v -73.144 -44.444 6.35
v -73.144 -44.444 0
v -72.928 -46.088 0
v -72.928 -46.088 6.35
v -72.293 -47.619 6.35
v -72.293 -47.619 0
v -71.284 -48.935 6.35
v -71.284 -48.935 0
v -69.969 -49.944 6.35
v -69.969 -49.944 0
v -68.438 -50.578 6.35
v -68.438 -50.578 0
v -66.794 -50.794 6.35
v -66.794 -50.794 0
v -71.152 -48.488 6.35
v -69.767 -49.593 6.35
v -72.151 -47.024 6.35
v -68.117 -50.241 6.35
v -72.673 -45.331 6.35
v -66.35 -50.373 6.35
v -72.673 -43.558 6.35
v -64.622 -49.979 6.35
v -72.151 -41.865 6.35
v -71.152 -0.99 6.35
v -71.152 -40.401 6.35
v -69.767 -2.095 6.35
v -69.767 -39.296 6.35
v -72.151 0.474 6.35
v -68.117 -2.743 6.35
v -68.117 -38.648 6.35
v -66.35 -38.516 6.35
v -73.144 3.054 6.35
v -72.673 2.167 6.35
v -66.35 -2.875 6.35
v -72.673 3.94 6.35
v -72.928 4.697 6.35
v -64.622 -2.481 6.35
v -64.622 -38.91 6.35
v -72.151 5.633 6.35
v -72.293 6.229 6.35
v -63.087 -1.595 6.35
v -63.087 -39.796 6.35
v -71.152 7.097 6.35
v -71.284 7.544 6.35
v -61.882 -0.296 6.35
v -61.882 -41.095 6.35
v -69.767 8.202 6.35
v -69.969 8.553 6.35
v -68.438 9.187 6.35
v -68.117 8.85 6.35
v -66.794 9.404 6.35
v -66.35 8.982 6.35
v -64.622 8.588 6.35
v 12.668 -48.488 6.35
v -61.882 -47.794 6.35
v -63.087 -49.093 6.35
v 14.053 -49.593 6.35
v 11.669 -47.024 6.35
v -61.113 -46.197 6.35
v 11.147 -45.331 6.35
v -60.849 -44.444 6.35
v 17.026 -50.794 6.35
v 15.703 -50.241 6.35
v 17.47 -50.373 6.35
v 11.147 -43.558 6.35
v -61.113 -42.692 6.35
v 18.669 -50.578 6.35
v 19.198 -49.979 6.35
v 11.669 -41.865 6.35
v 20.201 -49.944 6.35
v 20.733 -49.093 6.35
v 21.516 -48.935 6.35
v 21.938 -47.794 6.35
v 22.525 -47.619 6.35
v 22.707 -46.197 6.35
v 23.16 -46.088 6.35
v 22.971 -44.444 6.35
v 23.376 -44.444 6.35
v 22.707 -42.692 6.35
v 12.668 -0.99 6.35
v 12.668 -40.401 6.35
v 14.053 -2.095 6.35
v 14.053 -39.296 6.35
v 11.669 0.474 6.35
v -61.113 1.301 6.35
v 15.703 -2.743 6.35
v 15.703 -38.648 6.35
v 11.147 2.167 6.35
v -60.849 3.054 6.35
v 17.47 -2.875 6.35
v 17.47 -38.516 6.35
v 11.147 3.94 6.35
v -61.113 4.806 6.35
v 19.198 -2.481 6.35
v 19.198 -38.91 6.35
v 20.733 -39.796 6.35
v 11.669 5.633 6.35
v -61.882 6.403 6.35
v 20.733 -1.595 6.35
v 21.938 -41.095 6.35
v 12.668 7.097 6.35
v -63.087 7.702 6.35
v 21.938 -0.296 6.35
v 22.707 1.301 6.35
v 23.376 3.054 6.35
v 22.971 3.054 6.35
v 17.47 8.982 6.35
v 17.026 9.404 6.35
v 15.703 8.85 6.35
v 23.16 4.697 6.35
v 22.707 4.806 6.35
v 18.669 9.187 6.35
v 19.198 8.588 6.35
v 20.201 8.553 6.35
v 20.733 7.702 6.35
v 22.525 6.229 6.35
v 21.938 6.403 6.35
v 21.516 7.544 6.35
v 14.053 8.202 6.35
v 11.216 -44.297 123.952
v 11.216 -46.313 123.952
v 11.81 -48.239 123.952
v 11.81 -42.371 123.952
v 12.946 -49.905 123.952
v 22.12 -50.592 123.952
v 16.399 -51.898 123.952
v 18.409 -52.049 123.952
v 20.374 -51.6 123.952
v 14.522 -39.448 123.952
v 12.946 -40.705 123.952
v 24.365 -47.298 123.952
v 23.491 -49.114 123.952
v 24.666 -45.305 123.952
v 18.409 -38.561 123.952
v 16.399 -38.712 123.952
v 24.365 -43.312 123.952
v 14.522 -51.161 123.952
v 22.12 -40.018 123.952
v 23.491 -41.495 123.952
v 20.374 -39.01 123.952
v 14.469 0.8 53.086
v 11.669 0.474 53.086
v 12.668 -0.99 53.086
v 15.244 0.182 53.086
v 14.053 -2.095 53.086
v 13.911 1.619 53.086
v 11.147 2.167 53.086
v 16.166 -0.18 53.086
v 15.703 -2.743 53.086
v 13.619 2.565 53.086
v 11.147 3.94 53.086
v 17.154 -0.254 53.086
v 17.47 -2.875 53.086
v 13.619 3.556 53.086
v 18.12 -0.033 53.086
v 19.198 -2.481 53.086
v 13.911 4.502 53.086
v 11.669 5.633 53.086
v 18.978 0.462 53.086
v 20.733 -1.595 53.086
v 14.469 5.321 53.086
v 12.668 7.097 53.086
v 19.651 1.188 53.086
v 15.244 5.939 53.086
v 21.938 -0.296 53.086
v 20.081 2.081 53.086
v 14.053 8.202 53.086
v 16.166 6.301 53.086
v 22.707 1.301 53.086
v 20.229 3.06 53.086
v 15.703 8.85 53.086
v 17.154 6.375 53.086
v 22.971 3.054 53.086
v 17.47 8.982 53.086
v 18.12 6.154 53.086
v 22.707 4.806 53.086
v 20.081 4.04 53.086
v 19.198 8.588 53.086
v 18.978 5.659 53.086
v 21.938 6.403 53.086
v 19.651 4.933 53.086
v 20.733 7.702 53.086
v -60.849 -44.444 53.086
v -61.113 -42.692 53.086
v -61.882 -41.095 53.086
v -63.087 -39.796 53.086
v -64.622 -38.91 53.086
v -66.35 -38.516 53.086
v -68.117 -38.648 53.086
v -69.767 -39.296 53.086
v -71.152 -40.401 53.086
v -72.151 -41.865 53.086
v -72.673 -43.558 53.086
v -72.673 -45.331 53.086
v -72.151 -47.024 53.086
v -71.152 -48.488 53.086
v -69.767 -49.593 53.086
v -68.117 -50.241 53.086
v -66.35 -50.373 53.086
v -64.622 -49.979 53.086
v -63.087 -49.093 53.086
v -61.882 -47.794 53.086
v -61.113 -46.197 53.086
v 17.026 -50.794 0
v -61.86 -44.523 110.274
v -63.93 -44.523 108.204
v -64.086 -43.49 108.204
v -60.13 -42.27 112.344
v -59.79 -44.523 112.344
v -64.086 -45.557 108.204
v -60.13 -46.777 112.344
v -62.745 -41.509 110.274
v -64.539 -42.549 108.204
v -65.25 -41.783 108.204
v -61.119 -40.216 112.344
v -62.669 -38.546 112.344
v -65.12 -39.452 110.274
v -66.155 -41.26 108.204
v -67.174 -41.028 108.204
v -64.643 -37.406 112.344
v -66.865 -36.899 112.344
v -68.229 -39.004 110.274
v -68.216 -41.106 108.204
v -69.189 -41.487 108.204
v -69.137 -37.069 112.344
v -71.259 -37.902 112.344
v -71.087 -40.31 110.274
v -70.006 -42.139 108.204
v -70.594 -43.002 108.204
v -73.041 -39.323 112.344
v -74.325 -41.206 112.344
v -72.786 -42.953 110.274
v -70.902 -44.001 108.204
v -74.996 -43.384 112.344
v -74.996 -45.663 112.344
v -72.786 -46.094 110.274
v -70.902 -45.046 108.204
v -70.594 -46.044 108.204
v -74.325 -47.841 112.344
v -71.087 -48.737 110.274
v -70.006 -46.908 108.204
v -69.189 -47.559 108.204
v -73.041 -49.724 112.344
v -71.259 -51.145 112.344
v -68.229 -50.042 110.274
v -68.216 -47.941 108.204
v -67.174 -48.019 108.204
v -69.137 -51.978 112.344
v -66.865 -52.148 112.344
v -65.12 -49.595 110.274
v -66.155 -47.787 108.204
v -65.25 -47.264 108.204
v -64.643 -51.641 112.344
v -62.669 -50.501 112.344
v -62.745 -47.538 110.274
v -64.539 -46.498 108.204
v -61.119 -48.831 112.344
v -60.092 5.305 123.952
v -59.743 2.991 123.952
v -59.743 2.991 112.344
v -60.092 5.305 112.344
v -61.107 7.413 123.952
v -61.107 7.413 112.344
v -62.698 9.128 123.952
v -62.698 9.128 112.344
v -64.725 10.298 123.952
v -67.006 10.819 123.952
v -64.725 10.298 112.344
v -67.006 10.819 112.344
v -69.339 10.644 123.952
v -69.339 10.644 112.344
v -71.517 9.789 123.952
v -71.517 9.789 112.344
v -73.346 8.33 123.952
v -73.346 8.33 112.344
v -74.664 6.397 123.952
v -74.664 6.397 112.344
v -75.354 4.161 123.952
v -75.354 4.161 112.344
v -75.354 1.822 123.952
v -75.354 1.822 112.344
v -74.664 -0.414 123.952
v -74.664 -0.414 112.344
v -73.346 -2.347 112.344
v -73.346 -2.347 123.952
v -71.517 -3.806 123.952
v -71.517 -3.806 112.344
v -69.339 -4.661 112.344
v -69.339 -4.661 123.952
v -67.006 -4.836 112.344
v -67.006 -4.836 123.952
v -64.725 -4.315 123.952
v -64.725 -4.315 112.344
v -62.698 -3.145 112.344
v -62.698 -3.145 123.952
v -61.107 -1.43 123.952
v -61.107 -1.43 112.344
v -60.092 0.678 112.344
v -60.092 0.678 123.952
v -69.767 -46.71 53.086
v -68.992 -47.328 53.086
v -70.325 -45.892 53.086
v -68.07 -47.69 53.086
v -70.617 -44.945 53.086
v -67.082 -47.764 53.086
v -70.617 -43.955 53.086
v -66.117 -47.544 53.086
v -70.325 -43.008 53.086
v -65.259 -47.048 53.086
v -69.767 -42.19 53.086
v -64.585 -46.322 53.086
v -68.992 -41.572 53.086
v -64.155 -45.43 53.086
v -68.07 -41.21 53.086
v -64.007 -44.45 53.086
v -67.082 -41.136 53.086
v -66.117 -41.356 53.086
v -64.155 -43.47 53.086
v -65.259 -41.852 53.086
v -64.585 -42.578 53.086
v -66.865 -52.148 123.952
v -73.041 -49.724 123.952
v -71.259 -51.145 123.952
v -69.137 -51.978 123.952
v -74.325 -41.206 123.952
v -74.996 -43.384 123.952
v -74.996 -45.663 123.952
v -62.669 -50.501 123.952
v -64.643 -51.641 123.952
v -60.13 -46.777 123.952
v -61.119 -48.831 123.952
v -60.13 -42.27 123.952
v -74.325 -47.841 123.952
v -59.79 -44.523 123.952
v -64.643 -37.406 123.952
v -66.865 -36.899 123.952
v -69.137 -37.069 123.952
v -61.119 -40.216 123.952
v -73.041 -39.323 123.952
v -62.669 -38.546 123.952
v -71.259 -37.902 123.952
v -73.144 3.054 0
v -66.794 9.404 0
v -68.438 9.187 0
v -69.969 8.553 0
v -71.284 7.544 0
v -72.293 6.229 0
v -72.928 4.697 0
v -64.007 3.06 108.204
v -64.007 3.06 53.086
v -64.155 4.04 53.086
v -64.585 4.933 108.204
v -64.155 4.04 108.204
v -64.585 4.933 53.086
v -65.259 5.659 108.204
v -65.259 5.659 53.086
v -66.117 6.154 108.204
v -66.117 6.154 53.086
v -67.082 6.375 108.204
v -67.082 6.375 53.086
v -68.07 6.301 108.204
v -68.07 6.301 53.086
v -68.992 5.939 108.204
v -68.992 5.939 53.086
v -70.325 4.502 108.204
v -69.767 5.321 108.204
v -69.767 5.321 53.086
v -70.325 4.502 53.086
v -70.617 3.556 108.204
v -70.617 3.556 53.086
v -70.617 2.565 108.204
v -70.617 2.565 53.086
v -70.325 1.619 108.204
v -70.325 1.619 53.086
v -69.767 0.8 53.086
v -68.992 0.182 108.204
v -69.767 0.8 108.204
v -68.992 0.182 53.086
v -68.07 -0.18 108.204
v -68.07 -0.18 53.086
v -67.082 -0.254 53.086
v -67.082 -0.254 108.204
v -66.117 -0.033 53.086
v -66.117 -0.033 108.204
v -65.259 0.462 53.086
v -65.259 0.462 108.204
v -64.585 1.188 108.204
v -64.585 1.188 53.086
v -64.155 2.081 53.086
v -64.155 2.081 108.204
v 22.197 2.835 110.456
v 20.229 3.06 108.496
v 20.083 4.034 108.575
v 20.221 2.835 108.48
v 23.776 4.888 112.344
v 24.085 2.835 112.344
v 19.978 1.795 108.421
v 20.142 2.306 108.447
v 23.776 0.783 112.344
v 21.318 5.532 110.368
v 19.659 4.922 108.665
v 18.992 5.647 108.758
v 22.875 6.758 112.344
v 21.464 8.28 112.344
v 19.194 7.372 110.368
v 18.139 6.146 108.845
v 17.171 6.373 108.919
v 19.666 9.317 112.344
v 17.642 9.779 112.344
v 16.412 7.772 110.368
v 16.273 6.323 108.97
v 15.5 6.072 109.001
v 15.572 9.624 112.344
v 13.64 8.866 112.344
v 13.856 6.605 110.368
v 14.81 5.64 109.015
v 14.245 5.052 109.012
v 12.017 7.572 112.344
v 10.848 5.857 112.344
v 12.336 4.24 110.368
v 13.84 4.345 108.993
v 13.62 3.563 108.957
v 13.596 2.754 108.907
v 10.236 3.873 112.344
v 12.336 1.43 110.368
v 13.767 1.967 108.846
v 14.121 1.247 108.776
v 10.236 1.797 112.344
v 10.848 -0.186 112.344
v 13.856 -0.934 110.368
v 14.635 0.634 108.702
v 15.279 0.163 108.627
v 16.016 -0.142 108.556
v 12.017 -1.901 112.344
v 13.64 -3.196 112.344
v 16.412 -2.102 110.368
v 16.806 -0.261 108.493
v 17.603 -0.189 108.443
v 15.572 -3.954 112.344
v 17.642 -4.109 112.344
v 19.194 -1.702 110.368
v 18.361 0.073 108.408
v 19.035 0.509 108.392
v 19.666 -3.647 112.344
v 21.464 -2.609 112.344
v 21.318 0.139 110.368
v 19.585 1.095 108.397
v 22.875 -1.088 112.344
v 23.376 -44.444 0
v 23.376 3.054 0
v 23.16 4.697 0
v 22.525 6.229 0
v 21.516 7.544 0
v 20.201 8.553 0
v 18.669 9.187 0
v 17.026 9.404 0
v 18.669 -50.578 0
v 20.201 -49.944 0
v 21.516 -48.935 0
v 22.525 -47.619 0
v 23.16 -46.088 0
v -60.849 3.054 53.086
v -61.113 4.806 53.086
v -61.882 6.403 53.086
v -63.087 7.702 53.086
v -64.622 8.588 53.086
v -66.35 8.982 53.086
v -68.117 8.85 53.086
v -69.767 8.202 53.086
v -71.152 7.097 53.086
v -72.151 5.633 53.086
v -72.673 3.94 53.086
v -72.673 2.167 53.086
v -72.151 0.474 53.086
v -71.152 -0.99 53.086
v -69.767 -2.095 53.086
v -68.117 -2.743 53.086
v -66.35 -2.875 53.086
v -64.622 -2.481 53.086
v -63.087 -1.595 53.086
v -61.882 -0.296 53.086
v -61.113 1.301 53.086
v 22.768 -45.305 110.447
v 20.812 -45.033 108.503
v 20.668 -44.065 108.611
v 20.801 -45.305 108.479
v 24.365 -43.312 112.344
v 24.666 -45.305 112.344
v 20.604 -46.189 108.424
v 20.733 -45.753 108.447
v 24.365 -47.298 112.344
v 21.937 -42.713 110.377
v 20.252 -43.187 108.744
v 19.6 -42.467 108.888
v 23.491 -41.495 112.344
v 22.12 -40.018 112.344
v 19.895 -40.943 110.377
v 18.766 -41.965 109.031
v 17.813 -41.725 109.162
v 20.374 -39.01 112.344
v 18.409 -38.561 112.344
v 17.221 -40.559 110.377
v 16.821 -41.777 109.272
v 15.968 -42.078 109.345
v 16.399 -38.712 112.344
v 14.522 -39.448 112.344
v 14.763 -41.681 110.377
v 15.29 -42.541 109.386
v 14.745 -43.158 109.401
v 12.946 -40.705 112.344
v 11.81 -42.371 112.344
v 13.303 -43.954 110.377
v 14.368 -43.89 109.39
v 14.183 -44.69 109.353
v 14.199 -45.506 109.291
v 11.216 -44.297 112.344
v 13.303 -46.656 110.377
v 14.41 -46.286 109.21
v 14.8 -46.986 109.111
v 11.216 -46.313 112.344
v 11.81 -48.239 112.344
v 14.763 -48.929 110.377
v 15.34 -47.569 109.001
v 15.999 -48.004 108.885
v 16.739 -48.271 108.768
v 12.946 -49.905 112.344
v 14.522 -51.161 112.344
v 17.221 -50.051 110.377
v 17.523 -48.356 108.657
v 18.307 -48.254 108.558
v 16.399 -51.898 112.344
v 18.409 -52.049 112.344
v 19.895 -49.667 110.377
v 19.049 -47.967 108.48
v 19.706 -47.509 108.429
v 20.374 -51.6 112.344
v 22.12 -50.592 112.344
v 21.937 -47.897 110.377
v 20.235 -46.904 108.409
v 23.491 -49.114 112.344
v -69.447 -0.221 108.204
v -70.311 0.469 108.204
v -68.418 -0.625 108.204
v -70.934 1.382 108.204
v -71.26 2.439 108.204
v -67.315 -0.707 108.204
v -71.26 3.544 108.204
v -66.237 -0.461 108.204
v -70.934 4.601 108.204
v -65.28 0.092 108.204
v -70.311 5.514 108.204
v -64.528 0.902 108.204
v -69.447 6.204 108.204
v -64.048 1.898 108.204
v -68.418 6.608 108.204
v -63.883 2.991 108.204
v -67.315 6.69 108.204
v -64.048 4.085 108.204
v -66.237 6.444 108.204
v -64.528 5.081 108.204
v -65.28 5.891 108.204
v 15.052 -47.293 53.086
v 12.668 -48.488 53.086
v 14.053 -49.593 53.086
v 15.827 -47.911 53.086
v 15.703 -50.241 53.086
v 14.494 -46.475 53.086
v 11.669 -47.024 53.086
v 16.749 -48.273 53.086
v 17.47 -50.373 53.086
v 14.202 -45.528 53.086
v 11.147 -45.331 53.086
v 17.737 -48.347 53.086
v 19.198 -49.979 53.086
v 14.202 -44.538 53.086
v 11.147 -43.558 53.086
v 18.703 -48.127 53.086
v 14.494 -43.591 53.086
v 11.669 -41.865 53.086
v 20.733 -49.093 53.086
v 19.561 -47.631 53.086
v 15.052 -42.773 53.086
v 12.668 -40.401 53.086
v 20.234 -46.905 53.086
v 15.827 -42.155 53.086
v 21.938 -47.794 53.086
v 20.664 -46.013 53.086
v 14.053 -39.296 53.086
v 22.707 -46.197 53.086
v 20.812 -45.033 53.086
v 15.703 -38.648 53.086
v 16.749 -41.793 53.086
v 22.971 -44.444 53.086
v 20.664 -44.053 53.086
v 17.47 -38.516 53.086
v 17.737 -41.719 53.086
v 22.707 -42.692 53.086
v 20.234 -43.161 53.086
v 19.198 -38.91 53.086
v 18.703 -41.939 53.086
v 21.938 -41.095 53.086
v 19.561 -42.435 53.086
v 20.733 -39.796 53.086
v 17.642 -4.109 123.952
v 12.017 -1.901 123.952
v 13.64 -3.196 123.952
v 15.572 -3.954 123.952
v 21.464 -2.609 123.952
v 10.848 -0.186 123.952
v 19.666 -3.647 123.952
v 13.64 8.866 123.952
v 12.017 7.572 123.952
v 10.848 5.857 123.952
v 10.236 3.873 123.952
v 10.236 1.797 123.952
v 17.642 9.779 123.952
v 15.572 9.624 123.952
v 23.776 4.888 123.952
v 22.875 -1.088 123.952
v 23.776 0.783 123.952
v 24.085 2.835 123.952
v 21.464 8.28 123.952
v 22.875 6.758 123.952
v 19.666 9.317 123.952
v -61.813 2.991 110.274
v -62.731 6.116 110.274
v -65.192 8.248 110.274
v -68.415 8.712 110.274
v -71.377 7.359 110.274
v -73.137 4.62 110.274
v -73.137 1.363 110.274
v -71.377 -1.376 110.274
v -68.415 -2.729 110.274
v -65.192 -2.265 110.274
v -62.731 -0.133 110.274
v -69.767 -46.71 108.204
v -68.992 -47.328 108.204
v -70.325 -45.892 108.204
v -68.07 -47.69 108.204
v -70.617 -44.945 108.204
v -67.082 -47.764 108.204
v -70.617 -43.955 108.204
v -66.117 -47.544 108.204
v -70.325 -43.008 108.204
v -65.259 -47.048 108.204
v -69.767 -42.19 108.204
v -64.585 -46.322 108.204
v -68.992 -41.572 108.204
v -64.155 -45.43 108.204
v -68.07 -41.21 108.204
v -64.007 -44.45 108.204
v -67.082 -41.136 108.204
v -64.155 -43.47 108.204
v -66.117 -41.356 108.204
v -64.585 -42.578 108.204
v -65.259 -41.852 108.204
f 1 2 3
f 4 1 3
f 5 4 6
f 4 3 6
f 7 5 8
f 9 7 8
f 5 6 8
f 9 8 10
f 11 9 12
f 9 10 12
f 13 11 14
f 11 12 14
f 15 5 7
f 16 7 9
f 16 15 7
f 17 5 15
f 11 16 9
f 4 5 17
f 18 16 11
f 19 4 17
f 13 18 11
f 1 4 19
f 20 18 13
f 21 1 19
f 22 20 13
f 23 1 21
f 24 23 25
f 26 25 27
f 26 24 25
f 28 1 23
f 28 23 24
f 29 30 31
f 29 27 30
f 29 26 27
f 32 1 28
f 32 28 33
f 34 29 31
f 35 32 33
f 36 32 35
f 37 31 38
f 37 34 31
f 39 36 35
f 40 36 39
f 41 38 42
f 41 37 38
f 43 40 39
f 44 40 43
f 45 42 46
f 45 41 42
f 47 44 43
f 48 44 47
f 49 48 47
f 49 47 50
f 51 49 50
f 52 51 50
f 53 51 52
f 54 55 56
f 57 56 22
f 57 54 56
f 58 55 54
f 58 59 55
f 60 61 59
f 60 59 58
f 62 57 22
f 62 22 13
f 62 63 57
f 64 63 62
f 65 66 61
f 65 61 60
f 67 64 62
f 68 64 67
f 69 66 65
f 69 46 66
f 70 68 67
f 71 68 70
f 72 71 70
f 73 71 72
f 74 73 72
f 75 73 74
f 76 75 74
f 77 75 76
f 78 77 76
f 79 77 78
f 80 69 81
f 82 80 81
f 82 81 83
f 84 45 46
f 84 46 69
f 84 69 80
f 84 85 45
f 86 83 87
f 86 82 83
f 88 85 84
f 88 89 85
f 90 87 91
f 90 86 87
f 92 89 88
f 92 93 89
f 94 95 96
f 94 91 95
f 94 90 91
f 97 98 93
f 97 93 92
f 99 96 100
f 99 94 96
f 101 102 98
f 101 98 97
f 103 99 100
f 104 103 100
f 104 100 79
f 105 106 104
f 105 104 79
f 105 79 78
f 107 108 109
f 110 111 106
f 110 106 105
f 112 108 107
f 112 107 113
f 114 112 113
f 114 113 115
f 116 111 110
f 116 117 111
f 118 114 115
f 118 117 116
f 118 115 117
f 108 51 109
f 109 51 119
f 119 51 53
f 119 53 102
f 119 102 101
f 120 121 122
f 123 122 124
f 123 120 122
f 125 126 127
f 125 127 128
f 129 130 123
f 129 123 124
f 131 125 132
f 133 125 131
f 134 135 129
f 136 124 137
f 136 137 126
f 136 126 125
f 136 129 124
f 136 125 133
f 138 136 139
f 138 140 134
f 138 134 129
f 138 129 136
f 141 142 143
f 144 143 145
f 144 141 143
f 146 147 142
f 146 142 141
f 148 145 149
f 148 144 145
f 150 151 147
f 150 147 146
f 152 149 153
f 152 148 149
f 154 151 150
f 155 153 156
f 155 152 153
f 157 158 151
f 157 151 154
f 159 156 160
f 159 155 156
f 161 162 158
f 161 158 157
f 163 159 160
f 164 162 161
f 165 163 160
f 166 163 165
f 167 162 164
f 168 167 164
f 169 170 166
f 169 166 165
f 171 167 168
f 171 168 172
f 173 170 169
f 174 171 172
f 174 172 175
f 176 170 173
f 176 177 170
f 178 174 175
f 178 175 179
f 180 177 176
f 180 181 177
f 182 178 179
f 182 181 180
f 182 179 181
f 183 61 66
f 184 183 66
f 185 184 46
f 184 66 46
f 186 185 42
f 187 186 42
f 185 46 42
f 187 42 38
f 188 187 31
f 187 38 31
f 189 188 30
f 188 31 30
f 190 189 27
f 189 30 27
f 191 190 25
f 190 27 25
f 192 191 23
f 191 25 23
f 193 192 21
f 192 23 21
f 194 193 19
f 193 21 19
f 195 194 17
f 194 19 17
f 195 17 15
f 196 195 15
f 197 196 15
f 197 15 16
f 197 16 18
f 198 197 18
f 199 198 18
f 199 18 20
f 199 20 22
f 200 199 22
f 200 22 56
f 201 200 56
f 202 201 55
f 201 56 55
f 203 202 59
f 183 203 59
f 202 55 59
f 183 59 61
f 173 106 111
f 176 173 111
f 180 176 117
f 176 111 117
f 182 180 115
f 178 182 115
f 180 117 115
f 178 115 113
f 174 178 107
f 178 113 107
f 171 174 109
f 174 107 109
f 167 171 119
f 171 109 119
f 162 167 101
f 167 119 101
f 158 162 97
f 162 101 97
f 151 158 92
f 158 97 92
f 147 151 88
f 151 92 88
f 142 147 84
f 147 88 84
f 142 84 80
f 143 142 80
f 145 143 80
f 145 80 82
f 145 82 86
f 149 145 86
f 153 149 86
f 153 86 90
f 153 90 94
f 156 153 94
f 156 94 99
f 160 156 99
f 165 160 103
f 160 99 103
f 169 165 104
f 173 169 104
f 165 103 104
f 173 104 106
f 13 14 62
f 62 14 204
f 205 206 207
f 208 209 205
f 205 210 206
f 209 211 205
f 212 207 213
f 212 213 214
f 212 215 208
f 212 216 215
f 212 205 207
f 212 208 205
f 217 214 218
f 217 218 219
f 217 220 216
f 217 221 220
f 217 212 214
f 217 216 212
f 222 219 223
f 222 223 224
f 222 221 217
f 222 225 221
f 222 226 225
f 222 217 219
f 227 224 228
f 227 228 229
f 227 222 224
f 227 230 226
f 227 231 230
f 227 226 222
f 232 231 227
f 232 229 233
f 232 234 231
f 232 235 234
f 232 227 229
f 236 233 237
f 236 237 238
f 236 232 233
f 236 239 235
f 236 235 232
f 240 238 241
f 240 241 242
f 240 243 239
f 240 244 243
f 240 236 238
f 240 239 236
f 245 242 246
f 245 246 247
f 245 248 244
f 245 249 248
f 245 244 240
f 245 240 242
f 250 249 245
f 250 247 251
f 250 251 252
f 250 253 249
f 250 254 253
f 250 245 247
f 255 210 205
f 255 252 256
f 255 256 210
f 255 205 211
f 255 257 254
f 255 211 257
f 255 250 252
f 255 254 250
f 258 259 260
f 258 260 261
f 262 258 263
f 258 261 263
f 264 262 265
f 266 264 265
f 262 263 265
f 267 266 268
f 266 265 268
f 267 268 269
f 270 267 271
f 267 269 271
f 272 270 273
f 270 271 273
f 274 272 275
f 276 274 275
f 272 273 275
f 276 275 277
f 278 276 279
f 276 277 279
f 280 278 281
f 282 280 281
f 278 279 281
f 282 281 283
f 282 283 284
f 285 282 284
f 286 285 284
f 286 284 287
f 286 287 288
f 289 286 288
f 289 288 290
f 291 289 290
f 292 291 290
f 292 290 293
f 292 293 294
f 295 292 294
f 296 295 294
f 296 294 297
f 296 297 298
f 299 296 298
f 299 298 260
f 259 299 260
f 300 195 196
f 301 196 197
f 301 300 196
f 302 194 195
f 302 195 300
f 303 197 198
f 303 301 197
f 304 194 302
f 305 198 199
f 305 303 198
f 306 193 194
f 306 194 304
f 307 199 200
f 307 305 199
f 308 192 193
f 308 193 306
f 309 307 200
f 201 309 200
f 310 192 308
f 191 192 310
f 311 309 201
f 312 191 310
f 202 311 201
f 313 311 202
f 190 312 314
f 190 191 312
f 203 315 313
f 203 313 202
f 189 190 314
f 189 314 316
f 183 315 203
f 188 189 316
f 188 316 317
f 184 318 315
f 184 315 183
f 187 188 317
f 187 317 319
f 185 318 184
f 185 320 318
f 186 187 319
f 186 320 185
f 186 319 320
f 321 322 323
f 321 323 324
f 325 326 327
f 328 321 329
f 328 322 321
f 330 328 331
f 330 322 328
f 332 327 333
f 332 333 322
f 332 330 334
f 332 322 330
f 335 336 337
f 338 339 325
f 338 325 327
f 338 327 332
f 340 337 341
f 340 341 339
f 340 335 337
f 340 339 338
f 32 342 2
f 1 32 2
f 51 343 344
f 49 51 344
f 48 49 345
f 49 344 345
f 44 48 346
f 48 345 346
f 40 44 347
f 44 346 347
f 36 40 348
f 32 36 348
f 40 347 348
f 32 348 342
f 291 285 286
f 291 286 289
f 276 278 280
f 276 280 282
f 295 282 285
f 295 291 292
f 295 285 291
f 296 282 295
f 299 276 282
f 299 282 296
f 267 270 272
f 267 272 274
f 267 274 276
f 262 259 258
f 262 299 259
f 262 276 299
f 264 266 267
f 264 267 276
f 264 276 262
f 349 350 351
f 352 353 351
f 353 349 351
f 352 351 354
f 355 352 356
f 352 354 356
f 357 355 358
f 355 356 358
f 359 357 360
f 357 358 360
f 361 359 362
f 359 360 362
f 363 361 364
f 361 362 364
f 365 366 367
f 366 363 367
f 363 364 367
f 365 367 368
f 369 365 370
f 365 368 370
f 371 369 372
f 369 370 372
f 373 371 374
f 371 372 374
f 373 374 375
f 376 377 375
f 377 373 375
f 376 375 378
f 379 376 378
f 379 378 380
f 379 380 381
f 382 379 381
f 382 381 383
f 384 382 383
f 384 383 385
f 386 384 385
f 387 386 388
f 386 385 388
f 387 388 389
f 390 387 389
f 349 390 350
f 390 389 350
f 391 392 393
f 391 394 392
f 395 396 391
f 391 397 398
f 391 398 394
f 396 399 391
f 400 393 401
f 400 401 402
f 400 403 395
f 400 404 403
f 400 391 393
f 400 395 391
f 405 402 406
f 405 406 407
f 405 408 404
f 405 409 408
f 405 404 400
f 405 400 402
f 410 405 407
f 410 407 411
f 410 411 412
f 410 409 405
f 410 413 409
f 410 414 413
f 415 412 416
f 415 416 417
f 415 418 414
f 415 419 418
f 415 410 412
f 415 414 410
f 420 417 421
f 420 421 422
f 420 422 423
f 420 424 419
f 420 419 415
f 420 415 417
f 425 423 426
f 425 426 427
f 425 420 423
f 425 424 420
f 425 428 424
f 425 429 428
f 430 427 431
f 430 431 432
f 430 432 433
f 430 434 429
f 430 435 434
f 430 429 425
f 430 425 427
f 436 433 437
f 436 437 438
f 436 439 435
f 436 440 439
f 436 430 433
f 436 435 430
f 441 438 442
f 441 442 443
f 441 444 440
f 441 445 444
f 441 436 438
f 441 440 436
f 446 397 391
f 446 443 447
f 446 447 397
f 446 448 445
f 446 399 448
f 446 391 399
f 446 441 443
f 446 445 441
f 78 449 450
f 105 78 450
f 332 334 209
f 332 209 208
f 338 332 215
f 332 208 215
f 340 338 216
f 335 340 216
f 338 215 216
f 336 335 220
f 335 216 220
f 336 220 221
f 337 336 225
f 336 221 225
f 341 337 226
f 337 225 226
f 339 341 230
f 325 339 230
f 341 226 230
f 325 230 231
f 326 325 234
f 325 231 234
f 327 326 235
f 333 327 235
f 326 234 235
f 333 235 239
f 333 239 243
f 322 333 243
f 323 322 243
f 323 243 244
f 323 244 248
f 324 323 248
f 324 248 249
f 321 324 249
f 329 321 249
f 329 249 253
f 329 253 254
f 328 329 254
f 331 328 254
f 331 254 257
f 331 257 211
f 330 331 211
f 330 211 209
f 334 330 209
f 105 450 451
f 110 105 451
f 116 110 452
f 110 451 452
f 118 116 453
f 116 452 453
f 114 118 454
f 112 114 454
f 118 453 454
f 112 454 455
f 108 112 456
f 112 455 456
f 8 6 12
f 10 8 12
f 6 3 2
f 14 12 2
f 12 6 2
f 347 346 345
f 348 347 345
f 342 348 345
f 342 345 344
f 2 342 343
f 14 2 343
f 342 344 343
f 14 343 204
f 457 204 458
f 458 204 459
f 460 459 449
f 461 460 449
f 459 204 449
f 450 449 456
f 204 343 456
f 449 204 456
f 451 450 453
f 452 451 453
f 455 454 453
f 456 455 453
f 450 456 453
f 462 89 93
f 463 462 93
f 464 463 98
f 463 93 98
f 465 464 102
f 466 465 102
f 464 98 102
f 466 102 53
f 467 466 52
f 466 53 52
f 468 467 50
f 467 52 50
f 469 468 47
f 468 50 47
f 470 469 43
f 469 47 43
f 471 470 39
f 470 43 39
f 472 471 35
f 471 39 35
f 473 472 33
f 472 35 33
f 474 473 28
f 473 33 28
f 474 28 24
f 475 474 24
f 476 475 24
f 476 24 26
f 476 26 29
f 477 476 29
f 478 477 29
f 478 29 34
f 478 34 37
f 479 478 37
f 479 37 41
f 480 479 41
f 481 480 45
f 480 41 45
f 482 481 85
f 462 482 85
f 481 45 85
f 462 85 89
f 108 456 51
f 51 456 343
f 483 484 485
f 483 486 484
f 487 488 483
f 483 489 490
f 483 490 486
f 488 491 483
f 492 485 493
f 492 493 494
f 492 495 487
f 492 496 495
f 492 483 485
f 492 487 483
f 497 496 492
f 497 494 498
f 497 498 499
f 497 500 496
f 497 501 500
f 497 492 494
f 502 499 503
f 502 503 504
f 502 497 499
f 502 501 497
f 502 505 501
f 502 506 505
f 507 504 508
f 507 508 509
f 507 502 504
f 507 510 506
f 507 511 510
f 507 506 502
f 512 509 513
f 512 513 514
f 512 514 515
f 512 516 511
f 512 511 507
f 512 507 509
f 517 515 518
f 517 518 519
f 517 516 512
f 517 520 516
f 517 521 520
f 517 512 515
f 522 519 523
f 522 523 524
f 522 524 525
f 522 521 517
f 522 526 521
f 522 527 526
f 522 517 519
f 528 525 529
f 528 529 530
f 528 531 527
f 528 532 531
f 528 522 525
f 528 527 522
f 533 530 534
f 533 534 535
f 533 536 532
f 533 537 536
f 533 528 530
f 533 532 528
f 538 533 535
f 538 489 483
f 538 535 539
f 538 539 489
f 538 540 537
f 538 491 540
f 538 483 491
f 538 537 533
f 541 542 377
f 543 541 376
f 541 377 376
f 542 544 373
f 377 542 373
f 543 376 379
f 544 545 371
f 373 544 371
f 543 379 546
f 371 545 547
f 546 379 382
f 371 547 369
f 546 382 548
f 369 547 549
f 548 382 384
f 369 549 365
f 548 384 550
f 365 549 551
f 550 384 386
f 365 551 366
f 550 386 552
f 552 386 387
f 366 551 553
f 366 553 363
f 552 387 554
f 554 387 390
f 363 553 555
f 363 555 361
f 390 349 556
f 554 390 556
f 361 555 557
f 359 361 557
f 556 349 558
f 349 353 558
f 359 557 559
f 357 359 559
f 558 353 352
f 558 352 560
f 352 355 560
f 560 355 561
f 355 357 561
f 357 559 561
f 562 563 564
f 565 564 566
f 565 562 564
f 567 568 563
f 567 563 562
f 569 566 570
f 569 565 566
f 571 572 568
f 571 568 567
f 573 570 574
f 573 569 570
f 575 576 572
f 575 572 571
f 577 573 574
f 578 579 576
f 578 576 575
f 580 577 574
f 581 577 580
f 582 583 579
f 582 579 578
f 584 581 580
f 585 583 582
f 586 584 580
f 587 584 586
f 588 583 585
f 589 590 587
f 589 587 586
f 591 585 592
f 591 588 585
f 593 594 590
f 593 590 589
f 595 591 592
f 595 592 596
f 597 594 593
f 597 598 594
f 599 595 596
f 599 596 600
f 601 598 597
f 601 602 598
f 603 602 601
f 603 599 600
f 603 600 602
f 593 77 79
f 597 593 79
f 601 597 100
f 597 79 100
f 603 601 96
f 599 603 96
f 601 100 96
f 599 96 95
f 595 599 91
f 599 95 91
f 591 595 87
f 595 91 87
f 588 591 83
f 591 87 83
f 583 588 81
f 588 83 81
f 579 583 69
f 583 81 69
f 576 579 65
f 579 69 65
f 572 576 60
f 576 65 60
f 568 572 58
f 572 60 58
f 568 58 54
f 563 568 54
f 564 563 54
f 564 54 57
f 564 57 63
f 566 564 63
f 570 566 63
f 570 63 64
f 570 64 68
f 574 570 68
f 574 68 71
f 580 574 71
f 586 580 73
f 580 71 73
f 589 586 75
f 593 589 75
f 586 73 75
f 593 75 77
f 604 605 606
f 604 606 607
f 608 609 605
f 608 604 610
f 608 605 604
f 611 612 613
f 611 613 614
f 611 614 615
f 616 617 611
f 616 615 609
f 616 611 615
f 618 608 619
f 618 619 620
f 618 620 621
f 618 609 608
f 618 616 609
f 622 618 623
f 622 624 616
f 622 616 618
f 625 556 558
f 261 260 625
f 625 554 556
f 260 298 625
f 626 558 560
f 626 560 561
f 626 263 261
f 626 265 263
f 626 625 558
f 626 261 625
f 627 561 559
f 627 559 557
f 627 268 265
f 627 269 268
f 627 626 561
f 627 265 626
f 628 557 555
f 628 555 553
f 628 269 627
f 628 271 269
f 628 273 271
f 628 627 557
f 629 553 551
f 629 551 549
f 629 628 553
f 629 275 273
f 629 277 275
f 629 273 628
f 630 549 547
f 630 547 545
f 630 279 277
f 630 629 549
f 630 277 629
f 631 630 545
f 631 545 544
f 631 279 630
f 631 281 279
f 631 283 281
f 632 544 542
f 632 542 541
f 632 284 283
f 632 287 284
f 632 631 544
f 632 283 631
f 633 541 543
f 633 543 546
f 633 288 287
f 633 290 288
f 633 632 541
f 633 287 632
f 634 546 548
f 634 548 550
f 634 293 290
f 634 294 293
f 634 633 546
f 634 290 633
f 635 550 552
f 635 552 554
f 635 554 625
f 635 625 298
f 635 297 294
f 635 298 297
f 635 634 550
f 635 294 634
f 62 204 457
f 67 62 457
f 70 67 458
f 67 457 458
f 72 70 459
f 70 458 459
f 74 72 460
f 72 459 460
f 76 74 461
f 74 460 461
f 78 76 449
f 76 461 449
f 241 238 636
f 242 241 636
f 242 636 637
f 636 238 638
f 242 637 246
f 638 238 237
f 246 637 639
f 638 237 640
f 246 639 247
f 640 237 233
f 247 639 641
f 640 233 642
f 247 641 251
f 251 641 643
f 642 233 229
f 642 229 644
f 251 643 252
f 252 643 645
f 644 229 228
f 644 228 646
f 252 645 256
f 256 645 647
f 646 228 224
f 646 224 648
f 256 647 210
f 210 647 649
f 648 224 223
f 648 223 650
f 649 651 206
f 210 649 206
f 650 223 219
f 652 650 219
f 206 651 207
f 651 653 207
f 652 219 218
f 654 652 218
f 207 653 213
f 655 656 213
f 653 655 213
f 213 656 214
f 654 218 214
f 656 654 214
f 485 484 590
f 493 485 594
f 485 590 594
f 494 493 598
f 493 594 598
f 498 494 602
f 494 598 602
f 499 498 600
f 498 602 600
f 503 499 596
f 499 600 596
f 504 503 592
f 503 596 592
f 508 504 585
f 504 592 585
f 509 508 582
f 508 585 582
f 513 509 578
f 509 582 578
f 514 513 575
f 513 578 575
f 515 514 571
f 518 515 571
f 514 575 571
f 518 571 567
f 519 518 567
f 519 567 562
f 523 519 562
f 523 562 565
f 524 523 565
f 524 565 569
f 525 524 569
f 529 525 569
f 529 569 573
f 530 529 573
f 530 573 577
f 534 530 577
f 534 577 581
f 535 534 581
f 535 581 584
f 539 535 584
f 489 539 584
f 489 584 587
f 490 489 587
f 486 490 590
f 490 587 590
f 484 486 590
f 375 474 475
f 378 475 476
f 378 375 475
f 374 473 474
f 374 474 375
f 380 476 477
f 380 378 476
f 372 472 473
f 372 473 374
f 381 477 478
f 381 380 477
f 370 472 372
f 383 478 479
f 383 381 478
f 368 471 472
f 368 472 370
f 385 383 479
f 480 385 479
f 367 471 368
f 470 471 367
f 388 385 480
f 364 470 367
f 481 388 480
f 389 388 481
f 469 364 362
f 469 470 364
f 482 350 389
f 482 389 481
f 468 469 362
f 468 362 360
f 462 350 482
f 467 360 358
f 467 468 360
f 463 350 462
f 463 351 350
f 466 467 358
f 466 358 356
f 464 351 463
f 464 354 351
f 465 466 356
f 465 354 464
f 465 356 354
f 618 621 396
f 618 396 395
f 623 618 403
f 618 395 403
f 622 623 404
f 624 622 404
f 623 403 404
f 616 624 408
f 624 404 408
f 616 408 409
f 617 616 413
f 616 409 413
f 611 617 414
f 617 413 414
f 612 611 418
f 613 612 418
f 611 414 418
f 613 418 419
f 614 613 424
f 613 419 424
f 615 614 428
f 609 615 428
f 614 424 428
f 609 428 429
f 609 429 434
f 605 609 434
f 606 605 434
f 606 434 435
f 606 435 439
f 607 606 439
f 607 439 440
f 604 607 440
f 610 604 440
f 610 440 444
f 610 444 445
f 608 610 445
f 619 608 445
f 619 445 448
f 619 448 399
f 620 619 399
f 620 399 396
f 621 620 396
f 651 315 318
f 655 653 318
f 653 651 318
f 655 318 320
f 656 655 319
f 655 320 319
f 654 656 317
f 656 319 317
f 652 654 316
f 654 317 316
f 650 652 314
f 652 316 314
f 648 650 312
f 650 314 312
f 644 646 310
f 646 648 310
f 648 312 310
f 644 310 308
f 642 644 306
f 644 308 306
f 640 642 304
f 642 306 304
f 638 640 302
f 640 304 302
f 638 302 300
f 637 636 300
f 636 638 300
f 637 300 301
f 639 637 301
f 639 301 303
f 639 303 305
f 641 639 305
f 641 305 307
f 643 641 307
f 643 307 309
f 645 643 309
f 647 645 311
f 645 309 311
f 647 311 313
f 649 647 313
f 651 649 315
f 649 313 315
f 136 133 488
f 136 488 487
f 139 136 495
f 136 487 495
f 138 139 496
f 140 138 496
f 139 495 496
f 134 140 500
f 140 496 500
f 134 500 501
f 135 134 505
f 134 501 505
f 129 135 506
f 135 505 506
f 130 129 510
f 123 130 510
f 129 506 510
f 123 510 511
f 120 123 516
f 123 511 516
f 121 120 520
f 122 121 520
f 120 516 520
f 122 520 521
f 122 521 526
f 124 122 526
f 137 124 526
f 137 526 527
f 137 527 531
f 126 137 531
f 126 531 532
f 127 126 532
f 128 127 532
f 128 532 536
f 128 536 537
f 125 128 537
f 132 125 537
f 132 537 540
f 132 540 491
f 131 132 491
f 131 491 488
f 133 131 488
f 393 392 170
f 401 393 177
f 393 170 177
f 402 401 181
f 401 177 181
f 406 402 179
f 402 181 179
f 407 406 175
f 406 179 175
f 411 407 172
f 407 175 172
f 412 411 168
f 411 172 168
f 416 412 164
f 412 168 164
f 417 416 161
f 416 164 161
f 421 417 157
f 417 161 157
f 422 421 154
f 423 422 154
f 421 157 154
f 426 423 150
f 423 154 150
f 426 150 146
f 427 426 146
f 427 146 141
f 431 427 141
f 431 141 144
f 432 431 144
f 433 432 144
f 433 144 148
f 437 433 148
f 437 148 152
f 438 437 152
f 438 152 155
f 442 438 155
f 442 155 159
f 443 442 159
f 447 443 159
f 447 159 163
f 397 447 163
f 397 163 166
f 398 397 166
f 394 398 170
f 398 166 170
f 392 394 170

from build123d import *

# Parameters (mm, degrees)
F1_DEPTH     = 6.35
F2_R         = 5.9452870566
F3_DEPTH     = 46.736
F4_R         = 3.3233318127
F5_DEPTH     = 110.236
F7_START     = 108.204
F6_R         = 7.8492612618
F6_R_2       = 7.6458831821
F6_R_3       = 6.963642992
F6_R_4       = 6.7625316393
F7_DEPTH     = 15.748
F8_S9_R      = 3.3233318127
F8_T10_DEPTH = 11
F8_S15_R     = 3.3233318127
F8_T16_DEPTH = 12


# Not quite as in the source:
# - a fillet or chamfer that OpenCascade refuses, or shapes differently, is made with other operations: its cross-section is extruded or revolved along the edge and cut away or added


with BuildPart() as f1:
    # F0 (on Top) → F1 (new body)
    with BuildSketch(Plane.XY):
        with BuildLine():
            Line((17.025944097, 9.4035214942), (-66.794055903, 9.4035214942))
            ThreePointArc((-66.794055903, 9.4035214942), (-71.2841839635, 7.5436495547), (-73.144055903, 3.0535214942))
            Line((-73.144055903, 3.0535214942), (-73.144055903, -44.4444785058))
            ThreePointArc((-73.144055903, -44.4444785058), (-71.2841839635, -48.9346065664), (-66.794055903, -50.7944785058))
            Line((-66.794055903, -50.7944785058), (17.025944097, -50.7944785058))
            ThreePointArc((17.025944097, -50.7944785058), (21.5160721576, -48.9346065664), (23.375944097, -44.4444785058))
            Line((23.375944097, -44.4444785058), (23.375944097, 3.0535214942))
            ThreePointArc((23.375944097, 3.0535214942), (21.5160721576, 7.5436495547), (17.025944097, 9.4035214942))
        make_face()
    extrude(amount=F1_DEPTH)

    # F2 (on face) → F3 (join)
    with BuildSketch(Plane.XY.offset(6.35)):
        with Locations((-66.794055903, 3.0535214942)):
            Circle(F2_R)
        with Locations((17.025944097, 3.0535214942)):
            Circle(F2_R)
        with Locations((-66.794055903, -44.4444785058)):
            Circle(F2_R)
        with Locations((17.025944097, -44.4444785058)):
            Circle(F2_R)
    extrude(amount=F3_DEPTH)

    # F4 (on Top) → F5 (join)
    with BuildSketch(Plane.XY):
        with Locations((-67.3308223486, 3.0604917556)):
            Circle(F4_R)
        with Locations((16.9055722654, 3.0604917556)):
            Circle(F4_R)
        with Locations((-67.3308223486, -44.4500036538)):
            Circle(F4_R)
        with Locations((17.4885243177, -45.0329519808)):
            Circle(F4_R)
    extrude(amount=F5_DEPTH)

    # F6 (on Top) → F7 (join)
    with BuildSketch(Plane.XY.offset(F7_START)):
        with Locations((-67.5922632217, 2.9914693441)):
            Circle(F6_R)
        with Locations((-67.435964942, -44.5234365761)):
            Circle(F6_R_2)
        with Locations((17.121816054, 2.8351708315)):
            Circle(F6_R_3)
        with Locations((17.9033093154, -45.3049317002)):
            Circle(F6_R_4)
    extrude(amount=F7_DEPTH)

    # F8: chamfer of 4.1402 on 4 edges, made by hand

    # F8_s1 → F8_t2 (revolve, cut)
    with BuildSketch(Plane.XZ.offset(44.5234365761)):
        Polygon((-63.9302817599, 108.204), (-59.7900817599, 112.3442), (-59.7900817599, 108.204), align=None)
    revolve(axis=Axis((-67.435964942, -44.5234365761, 108.204), (0, 0, 1)), mode=Mode.SUBTRACT)

    # F8_s3 → F8_t4 (revolve, cut)
    with BuildSketch(Plane.XZ.offset(-2.9914693441)):
        Polygon((-63.8832019599, 108.204), (-59.7430019599, 112.3442), (-59.7430019599, 108.204), align=None)
    revolve(axis=Axis((-67.5922632217, 2.9914693441, 108.204), (0, 0, 1)), mode=Mode.SUBTRACT)


with BuildPart() as f8_tool6:
    # F8_s7 → F8_t8 (revolve)
    with BuildSketch(Plane.XZ.offset(45.3049317002)):
        Polygon((20.5256409548, 108.204), (24.6658409548, 112.3442), (24.6658409548, 108.204), align=None)
    revolve(axis=Axis((17.9033093154, -45.3049317002, 108.204), (0, 0, 1)))

    # F8_s9 → F8_t10 (cut, symmetric)
    with BuildSketch(Plane.XY.offset(110.3)):
        with Locations((17.4885243177, -45.0329519808)):
            Circle(F8_S9_R)
    extrude(amount=F8_T10_DEPTH, both=True, mode=Mode.SUBTRACT)


with BuildPart() as f1_1:
    add(f1.part)

    # F8_t5: cut F8_tool6
    add(f8_tool6.part, mode=Mode.SUBTRACT)


with BuildPart() as f8_tool12:
    # F8_s13 → F8_t14 (revolve)
    with BuildSketch(Plane.XZ.offset(-2.8351708315)):
        Polygon((19.945259046, 108.204), (24.085459046, 112.3442), (24.085459046, 108.204), align=None)
    revolve(axis=Axis((17.121816054, 2.8351708315, 108.204), (0, 0, 1)))

    # F8_s15 → F8_t16 (cut, symmetric)
    with BuildSketch(Plane.XY.offset(110.3)):
        with Locations((16.9055722654, 3.0604917556)):
            Circle(F8_S15_R)
    extrude(amount=F8_T16_DEPTH, both=True, mode=Mode.SUBTRACT)


with BuildPart() as f1_2:
    add(f1_1.part)

    # F8_t11: cut F8_tool12
    add(f8_tool12.part, mode=Mode.SUBTRACT)


solid = f1_2.part
